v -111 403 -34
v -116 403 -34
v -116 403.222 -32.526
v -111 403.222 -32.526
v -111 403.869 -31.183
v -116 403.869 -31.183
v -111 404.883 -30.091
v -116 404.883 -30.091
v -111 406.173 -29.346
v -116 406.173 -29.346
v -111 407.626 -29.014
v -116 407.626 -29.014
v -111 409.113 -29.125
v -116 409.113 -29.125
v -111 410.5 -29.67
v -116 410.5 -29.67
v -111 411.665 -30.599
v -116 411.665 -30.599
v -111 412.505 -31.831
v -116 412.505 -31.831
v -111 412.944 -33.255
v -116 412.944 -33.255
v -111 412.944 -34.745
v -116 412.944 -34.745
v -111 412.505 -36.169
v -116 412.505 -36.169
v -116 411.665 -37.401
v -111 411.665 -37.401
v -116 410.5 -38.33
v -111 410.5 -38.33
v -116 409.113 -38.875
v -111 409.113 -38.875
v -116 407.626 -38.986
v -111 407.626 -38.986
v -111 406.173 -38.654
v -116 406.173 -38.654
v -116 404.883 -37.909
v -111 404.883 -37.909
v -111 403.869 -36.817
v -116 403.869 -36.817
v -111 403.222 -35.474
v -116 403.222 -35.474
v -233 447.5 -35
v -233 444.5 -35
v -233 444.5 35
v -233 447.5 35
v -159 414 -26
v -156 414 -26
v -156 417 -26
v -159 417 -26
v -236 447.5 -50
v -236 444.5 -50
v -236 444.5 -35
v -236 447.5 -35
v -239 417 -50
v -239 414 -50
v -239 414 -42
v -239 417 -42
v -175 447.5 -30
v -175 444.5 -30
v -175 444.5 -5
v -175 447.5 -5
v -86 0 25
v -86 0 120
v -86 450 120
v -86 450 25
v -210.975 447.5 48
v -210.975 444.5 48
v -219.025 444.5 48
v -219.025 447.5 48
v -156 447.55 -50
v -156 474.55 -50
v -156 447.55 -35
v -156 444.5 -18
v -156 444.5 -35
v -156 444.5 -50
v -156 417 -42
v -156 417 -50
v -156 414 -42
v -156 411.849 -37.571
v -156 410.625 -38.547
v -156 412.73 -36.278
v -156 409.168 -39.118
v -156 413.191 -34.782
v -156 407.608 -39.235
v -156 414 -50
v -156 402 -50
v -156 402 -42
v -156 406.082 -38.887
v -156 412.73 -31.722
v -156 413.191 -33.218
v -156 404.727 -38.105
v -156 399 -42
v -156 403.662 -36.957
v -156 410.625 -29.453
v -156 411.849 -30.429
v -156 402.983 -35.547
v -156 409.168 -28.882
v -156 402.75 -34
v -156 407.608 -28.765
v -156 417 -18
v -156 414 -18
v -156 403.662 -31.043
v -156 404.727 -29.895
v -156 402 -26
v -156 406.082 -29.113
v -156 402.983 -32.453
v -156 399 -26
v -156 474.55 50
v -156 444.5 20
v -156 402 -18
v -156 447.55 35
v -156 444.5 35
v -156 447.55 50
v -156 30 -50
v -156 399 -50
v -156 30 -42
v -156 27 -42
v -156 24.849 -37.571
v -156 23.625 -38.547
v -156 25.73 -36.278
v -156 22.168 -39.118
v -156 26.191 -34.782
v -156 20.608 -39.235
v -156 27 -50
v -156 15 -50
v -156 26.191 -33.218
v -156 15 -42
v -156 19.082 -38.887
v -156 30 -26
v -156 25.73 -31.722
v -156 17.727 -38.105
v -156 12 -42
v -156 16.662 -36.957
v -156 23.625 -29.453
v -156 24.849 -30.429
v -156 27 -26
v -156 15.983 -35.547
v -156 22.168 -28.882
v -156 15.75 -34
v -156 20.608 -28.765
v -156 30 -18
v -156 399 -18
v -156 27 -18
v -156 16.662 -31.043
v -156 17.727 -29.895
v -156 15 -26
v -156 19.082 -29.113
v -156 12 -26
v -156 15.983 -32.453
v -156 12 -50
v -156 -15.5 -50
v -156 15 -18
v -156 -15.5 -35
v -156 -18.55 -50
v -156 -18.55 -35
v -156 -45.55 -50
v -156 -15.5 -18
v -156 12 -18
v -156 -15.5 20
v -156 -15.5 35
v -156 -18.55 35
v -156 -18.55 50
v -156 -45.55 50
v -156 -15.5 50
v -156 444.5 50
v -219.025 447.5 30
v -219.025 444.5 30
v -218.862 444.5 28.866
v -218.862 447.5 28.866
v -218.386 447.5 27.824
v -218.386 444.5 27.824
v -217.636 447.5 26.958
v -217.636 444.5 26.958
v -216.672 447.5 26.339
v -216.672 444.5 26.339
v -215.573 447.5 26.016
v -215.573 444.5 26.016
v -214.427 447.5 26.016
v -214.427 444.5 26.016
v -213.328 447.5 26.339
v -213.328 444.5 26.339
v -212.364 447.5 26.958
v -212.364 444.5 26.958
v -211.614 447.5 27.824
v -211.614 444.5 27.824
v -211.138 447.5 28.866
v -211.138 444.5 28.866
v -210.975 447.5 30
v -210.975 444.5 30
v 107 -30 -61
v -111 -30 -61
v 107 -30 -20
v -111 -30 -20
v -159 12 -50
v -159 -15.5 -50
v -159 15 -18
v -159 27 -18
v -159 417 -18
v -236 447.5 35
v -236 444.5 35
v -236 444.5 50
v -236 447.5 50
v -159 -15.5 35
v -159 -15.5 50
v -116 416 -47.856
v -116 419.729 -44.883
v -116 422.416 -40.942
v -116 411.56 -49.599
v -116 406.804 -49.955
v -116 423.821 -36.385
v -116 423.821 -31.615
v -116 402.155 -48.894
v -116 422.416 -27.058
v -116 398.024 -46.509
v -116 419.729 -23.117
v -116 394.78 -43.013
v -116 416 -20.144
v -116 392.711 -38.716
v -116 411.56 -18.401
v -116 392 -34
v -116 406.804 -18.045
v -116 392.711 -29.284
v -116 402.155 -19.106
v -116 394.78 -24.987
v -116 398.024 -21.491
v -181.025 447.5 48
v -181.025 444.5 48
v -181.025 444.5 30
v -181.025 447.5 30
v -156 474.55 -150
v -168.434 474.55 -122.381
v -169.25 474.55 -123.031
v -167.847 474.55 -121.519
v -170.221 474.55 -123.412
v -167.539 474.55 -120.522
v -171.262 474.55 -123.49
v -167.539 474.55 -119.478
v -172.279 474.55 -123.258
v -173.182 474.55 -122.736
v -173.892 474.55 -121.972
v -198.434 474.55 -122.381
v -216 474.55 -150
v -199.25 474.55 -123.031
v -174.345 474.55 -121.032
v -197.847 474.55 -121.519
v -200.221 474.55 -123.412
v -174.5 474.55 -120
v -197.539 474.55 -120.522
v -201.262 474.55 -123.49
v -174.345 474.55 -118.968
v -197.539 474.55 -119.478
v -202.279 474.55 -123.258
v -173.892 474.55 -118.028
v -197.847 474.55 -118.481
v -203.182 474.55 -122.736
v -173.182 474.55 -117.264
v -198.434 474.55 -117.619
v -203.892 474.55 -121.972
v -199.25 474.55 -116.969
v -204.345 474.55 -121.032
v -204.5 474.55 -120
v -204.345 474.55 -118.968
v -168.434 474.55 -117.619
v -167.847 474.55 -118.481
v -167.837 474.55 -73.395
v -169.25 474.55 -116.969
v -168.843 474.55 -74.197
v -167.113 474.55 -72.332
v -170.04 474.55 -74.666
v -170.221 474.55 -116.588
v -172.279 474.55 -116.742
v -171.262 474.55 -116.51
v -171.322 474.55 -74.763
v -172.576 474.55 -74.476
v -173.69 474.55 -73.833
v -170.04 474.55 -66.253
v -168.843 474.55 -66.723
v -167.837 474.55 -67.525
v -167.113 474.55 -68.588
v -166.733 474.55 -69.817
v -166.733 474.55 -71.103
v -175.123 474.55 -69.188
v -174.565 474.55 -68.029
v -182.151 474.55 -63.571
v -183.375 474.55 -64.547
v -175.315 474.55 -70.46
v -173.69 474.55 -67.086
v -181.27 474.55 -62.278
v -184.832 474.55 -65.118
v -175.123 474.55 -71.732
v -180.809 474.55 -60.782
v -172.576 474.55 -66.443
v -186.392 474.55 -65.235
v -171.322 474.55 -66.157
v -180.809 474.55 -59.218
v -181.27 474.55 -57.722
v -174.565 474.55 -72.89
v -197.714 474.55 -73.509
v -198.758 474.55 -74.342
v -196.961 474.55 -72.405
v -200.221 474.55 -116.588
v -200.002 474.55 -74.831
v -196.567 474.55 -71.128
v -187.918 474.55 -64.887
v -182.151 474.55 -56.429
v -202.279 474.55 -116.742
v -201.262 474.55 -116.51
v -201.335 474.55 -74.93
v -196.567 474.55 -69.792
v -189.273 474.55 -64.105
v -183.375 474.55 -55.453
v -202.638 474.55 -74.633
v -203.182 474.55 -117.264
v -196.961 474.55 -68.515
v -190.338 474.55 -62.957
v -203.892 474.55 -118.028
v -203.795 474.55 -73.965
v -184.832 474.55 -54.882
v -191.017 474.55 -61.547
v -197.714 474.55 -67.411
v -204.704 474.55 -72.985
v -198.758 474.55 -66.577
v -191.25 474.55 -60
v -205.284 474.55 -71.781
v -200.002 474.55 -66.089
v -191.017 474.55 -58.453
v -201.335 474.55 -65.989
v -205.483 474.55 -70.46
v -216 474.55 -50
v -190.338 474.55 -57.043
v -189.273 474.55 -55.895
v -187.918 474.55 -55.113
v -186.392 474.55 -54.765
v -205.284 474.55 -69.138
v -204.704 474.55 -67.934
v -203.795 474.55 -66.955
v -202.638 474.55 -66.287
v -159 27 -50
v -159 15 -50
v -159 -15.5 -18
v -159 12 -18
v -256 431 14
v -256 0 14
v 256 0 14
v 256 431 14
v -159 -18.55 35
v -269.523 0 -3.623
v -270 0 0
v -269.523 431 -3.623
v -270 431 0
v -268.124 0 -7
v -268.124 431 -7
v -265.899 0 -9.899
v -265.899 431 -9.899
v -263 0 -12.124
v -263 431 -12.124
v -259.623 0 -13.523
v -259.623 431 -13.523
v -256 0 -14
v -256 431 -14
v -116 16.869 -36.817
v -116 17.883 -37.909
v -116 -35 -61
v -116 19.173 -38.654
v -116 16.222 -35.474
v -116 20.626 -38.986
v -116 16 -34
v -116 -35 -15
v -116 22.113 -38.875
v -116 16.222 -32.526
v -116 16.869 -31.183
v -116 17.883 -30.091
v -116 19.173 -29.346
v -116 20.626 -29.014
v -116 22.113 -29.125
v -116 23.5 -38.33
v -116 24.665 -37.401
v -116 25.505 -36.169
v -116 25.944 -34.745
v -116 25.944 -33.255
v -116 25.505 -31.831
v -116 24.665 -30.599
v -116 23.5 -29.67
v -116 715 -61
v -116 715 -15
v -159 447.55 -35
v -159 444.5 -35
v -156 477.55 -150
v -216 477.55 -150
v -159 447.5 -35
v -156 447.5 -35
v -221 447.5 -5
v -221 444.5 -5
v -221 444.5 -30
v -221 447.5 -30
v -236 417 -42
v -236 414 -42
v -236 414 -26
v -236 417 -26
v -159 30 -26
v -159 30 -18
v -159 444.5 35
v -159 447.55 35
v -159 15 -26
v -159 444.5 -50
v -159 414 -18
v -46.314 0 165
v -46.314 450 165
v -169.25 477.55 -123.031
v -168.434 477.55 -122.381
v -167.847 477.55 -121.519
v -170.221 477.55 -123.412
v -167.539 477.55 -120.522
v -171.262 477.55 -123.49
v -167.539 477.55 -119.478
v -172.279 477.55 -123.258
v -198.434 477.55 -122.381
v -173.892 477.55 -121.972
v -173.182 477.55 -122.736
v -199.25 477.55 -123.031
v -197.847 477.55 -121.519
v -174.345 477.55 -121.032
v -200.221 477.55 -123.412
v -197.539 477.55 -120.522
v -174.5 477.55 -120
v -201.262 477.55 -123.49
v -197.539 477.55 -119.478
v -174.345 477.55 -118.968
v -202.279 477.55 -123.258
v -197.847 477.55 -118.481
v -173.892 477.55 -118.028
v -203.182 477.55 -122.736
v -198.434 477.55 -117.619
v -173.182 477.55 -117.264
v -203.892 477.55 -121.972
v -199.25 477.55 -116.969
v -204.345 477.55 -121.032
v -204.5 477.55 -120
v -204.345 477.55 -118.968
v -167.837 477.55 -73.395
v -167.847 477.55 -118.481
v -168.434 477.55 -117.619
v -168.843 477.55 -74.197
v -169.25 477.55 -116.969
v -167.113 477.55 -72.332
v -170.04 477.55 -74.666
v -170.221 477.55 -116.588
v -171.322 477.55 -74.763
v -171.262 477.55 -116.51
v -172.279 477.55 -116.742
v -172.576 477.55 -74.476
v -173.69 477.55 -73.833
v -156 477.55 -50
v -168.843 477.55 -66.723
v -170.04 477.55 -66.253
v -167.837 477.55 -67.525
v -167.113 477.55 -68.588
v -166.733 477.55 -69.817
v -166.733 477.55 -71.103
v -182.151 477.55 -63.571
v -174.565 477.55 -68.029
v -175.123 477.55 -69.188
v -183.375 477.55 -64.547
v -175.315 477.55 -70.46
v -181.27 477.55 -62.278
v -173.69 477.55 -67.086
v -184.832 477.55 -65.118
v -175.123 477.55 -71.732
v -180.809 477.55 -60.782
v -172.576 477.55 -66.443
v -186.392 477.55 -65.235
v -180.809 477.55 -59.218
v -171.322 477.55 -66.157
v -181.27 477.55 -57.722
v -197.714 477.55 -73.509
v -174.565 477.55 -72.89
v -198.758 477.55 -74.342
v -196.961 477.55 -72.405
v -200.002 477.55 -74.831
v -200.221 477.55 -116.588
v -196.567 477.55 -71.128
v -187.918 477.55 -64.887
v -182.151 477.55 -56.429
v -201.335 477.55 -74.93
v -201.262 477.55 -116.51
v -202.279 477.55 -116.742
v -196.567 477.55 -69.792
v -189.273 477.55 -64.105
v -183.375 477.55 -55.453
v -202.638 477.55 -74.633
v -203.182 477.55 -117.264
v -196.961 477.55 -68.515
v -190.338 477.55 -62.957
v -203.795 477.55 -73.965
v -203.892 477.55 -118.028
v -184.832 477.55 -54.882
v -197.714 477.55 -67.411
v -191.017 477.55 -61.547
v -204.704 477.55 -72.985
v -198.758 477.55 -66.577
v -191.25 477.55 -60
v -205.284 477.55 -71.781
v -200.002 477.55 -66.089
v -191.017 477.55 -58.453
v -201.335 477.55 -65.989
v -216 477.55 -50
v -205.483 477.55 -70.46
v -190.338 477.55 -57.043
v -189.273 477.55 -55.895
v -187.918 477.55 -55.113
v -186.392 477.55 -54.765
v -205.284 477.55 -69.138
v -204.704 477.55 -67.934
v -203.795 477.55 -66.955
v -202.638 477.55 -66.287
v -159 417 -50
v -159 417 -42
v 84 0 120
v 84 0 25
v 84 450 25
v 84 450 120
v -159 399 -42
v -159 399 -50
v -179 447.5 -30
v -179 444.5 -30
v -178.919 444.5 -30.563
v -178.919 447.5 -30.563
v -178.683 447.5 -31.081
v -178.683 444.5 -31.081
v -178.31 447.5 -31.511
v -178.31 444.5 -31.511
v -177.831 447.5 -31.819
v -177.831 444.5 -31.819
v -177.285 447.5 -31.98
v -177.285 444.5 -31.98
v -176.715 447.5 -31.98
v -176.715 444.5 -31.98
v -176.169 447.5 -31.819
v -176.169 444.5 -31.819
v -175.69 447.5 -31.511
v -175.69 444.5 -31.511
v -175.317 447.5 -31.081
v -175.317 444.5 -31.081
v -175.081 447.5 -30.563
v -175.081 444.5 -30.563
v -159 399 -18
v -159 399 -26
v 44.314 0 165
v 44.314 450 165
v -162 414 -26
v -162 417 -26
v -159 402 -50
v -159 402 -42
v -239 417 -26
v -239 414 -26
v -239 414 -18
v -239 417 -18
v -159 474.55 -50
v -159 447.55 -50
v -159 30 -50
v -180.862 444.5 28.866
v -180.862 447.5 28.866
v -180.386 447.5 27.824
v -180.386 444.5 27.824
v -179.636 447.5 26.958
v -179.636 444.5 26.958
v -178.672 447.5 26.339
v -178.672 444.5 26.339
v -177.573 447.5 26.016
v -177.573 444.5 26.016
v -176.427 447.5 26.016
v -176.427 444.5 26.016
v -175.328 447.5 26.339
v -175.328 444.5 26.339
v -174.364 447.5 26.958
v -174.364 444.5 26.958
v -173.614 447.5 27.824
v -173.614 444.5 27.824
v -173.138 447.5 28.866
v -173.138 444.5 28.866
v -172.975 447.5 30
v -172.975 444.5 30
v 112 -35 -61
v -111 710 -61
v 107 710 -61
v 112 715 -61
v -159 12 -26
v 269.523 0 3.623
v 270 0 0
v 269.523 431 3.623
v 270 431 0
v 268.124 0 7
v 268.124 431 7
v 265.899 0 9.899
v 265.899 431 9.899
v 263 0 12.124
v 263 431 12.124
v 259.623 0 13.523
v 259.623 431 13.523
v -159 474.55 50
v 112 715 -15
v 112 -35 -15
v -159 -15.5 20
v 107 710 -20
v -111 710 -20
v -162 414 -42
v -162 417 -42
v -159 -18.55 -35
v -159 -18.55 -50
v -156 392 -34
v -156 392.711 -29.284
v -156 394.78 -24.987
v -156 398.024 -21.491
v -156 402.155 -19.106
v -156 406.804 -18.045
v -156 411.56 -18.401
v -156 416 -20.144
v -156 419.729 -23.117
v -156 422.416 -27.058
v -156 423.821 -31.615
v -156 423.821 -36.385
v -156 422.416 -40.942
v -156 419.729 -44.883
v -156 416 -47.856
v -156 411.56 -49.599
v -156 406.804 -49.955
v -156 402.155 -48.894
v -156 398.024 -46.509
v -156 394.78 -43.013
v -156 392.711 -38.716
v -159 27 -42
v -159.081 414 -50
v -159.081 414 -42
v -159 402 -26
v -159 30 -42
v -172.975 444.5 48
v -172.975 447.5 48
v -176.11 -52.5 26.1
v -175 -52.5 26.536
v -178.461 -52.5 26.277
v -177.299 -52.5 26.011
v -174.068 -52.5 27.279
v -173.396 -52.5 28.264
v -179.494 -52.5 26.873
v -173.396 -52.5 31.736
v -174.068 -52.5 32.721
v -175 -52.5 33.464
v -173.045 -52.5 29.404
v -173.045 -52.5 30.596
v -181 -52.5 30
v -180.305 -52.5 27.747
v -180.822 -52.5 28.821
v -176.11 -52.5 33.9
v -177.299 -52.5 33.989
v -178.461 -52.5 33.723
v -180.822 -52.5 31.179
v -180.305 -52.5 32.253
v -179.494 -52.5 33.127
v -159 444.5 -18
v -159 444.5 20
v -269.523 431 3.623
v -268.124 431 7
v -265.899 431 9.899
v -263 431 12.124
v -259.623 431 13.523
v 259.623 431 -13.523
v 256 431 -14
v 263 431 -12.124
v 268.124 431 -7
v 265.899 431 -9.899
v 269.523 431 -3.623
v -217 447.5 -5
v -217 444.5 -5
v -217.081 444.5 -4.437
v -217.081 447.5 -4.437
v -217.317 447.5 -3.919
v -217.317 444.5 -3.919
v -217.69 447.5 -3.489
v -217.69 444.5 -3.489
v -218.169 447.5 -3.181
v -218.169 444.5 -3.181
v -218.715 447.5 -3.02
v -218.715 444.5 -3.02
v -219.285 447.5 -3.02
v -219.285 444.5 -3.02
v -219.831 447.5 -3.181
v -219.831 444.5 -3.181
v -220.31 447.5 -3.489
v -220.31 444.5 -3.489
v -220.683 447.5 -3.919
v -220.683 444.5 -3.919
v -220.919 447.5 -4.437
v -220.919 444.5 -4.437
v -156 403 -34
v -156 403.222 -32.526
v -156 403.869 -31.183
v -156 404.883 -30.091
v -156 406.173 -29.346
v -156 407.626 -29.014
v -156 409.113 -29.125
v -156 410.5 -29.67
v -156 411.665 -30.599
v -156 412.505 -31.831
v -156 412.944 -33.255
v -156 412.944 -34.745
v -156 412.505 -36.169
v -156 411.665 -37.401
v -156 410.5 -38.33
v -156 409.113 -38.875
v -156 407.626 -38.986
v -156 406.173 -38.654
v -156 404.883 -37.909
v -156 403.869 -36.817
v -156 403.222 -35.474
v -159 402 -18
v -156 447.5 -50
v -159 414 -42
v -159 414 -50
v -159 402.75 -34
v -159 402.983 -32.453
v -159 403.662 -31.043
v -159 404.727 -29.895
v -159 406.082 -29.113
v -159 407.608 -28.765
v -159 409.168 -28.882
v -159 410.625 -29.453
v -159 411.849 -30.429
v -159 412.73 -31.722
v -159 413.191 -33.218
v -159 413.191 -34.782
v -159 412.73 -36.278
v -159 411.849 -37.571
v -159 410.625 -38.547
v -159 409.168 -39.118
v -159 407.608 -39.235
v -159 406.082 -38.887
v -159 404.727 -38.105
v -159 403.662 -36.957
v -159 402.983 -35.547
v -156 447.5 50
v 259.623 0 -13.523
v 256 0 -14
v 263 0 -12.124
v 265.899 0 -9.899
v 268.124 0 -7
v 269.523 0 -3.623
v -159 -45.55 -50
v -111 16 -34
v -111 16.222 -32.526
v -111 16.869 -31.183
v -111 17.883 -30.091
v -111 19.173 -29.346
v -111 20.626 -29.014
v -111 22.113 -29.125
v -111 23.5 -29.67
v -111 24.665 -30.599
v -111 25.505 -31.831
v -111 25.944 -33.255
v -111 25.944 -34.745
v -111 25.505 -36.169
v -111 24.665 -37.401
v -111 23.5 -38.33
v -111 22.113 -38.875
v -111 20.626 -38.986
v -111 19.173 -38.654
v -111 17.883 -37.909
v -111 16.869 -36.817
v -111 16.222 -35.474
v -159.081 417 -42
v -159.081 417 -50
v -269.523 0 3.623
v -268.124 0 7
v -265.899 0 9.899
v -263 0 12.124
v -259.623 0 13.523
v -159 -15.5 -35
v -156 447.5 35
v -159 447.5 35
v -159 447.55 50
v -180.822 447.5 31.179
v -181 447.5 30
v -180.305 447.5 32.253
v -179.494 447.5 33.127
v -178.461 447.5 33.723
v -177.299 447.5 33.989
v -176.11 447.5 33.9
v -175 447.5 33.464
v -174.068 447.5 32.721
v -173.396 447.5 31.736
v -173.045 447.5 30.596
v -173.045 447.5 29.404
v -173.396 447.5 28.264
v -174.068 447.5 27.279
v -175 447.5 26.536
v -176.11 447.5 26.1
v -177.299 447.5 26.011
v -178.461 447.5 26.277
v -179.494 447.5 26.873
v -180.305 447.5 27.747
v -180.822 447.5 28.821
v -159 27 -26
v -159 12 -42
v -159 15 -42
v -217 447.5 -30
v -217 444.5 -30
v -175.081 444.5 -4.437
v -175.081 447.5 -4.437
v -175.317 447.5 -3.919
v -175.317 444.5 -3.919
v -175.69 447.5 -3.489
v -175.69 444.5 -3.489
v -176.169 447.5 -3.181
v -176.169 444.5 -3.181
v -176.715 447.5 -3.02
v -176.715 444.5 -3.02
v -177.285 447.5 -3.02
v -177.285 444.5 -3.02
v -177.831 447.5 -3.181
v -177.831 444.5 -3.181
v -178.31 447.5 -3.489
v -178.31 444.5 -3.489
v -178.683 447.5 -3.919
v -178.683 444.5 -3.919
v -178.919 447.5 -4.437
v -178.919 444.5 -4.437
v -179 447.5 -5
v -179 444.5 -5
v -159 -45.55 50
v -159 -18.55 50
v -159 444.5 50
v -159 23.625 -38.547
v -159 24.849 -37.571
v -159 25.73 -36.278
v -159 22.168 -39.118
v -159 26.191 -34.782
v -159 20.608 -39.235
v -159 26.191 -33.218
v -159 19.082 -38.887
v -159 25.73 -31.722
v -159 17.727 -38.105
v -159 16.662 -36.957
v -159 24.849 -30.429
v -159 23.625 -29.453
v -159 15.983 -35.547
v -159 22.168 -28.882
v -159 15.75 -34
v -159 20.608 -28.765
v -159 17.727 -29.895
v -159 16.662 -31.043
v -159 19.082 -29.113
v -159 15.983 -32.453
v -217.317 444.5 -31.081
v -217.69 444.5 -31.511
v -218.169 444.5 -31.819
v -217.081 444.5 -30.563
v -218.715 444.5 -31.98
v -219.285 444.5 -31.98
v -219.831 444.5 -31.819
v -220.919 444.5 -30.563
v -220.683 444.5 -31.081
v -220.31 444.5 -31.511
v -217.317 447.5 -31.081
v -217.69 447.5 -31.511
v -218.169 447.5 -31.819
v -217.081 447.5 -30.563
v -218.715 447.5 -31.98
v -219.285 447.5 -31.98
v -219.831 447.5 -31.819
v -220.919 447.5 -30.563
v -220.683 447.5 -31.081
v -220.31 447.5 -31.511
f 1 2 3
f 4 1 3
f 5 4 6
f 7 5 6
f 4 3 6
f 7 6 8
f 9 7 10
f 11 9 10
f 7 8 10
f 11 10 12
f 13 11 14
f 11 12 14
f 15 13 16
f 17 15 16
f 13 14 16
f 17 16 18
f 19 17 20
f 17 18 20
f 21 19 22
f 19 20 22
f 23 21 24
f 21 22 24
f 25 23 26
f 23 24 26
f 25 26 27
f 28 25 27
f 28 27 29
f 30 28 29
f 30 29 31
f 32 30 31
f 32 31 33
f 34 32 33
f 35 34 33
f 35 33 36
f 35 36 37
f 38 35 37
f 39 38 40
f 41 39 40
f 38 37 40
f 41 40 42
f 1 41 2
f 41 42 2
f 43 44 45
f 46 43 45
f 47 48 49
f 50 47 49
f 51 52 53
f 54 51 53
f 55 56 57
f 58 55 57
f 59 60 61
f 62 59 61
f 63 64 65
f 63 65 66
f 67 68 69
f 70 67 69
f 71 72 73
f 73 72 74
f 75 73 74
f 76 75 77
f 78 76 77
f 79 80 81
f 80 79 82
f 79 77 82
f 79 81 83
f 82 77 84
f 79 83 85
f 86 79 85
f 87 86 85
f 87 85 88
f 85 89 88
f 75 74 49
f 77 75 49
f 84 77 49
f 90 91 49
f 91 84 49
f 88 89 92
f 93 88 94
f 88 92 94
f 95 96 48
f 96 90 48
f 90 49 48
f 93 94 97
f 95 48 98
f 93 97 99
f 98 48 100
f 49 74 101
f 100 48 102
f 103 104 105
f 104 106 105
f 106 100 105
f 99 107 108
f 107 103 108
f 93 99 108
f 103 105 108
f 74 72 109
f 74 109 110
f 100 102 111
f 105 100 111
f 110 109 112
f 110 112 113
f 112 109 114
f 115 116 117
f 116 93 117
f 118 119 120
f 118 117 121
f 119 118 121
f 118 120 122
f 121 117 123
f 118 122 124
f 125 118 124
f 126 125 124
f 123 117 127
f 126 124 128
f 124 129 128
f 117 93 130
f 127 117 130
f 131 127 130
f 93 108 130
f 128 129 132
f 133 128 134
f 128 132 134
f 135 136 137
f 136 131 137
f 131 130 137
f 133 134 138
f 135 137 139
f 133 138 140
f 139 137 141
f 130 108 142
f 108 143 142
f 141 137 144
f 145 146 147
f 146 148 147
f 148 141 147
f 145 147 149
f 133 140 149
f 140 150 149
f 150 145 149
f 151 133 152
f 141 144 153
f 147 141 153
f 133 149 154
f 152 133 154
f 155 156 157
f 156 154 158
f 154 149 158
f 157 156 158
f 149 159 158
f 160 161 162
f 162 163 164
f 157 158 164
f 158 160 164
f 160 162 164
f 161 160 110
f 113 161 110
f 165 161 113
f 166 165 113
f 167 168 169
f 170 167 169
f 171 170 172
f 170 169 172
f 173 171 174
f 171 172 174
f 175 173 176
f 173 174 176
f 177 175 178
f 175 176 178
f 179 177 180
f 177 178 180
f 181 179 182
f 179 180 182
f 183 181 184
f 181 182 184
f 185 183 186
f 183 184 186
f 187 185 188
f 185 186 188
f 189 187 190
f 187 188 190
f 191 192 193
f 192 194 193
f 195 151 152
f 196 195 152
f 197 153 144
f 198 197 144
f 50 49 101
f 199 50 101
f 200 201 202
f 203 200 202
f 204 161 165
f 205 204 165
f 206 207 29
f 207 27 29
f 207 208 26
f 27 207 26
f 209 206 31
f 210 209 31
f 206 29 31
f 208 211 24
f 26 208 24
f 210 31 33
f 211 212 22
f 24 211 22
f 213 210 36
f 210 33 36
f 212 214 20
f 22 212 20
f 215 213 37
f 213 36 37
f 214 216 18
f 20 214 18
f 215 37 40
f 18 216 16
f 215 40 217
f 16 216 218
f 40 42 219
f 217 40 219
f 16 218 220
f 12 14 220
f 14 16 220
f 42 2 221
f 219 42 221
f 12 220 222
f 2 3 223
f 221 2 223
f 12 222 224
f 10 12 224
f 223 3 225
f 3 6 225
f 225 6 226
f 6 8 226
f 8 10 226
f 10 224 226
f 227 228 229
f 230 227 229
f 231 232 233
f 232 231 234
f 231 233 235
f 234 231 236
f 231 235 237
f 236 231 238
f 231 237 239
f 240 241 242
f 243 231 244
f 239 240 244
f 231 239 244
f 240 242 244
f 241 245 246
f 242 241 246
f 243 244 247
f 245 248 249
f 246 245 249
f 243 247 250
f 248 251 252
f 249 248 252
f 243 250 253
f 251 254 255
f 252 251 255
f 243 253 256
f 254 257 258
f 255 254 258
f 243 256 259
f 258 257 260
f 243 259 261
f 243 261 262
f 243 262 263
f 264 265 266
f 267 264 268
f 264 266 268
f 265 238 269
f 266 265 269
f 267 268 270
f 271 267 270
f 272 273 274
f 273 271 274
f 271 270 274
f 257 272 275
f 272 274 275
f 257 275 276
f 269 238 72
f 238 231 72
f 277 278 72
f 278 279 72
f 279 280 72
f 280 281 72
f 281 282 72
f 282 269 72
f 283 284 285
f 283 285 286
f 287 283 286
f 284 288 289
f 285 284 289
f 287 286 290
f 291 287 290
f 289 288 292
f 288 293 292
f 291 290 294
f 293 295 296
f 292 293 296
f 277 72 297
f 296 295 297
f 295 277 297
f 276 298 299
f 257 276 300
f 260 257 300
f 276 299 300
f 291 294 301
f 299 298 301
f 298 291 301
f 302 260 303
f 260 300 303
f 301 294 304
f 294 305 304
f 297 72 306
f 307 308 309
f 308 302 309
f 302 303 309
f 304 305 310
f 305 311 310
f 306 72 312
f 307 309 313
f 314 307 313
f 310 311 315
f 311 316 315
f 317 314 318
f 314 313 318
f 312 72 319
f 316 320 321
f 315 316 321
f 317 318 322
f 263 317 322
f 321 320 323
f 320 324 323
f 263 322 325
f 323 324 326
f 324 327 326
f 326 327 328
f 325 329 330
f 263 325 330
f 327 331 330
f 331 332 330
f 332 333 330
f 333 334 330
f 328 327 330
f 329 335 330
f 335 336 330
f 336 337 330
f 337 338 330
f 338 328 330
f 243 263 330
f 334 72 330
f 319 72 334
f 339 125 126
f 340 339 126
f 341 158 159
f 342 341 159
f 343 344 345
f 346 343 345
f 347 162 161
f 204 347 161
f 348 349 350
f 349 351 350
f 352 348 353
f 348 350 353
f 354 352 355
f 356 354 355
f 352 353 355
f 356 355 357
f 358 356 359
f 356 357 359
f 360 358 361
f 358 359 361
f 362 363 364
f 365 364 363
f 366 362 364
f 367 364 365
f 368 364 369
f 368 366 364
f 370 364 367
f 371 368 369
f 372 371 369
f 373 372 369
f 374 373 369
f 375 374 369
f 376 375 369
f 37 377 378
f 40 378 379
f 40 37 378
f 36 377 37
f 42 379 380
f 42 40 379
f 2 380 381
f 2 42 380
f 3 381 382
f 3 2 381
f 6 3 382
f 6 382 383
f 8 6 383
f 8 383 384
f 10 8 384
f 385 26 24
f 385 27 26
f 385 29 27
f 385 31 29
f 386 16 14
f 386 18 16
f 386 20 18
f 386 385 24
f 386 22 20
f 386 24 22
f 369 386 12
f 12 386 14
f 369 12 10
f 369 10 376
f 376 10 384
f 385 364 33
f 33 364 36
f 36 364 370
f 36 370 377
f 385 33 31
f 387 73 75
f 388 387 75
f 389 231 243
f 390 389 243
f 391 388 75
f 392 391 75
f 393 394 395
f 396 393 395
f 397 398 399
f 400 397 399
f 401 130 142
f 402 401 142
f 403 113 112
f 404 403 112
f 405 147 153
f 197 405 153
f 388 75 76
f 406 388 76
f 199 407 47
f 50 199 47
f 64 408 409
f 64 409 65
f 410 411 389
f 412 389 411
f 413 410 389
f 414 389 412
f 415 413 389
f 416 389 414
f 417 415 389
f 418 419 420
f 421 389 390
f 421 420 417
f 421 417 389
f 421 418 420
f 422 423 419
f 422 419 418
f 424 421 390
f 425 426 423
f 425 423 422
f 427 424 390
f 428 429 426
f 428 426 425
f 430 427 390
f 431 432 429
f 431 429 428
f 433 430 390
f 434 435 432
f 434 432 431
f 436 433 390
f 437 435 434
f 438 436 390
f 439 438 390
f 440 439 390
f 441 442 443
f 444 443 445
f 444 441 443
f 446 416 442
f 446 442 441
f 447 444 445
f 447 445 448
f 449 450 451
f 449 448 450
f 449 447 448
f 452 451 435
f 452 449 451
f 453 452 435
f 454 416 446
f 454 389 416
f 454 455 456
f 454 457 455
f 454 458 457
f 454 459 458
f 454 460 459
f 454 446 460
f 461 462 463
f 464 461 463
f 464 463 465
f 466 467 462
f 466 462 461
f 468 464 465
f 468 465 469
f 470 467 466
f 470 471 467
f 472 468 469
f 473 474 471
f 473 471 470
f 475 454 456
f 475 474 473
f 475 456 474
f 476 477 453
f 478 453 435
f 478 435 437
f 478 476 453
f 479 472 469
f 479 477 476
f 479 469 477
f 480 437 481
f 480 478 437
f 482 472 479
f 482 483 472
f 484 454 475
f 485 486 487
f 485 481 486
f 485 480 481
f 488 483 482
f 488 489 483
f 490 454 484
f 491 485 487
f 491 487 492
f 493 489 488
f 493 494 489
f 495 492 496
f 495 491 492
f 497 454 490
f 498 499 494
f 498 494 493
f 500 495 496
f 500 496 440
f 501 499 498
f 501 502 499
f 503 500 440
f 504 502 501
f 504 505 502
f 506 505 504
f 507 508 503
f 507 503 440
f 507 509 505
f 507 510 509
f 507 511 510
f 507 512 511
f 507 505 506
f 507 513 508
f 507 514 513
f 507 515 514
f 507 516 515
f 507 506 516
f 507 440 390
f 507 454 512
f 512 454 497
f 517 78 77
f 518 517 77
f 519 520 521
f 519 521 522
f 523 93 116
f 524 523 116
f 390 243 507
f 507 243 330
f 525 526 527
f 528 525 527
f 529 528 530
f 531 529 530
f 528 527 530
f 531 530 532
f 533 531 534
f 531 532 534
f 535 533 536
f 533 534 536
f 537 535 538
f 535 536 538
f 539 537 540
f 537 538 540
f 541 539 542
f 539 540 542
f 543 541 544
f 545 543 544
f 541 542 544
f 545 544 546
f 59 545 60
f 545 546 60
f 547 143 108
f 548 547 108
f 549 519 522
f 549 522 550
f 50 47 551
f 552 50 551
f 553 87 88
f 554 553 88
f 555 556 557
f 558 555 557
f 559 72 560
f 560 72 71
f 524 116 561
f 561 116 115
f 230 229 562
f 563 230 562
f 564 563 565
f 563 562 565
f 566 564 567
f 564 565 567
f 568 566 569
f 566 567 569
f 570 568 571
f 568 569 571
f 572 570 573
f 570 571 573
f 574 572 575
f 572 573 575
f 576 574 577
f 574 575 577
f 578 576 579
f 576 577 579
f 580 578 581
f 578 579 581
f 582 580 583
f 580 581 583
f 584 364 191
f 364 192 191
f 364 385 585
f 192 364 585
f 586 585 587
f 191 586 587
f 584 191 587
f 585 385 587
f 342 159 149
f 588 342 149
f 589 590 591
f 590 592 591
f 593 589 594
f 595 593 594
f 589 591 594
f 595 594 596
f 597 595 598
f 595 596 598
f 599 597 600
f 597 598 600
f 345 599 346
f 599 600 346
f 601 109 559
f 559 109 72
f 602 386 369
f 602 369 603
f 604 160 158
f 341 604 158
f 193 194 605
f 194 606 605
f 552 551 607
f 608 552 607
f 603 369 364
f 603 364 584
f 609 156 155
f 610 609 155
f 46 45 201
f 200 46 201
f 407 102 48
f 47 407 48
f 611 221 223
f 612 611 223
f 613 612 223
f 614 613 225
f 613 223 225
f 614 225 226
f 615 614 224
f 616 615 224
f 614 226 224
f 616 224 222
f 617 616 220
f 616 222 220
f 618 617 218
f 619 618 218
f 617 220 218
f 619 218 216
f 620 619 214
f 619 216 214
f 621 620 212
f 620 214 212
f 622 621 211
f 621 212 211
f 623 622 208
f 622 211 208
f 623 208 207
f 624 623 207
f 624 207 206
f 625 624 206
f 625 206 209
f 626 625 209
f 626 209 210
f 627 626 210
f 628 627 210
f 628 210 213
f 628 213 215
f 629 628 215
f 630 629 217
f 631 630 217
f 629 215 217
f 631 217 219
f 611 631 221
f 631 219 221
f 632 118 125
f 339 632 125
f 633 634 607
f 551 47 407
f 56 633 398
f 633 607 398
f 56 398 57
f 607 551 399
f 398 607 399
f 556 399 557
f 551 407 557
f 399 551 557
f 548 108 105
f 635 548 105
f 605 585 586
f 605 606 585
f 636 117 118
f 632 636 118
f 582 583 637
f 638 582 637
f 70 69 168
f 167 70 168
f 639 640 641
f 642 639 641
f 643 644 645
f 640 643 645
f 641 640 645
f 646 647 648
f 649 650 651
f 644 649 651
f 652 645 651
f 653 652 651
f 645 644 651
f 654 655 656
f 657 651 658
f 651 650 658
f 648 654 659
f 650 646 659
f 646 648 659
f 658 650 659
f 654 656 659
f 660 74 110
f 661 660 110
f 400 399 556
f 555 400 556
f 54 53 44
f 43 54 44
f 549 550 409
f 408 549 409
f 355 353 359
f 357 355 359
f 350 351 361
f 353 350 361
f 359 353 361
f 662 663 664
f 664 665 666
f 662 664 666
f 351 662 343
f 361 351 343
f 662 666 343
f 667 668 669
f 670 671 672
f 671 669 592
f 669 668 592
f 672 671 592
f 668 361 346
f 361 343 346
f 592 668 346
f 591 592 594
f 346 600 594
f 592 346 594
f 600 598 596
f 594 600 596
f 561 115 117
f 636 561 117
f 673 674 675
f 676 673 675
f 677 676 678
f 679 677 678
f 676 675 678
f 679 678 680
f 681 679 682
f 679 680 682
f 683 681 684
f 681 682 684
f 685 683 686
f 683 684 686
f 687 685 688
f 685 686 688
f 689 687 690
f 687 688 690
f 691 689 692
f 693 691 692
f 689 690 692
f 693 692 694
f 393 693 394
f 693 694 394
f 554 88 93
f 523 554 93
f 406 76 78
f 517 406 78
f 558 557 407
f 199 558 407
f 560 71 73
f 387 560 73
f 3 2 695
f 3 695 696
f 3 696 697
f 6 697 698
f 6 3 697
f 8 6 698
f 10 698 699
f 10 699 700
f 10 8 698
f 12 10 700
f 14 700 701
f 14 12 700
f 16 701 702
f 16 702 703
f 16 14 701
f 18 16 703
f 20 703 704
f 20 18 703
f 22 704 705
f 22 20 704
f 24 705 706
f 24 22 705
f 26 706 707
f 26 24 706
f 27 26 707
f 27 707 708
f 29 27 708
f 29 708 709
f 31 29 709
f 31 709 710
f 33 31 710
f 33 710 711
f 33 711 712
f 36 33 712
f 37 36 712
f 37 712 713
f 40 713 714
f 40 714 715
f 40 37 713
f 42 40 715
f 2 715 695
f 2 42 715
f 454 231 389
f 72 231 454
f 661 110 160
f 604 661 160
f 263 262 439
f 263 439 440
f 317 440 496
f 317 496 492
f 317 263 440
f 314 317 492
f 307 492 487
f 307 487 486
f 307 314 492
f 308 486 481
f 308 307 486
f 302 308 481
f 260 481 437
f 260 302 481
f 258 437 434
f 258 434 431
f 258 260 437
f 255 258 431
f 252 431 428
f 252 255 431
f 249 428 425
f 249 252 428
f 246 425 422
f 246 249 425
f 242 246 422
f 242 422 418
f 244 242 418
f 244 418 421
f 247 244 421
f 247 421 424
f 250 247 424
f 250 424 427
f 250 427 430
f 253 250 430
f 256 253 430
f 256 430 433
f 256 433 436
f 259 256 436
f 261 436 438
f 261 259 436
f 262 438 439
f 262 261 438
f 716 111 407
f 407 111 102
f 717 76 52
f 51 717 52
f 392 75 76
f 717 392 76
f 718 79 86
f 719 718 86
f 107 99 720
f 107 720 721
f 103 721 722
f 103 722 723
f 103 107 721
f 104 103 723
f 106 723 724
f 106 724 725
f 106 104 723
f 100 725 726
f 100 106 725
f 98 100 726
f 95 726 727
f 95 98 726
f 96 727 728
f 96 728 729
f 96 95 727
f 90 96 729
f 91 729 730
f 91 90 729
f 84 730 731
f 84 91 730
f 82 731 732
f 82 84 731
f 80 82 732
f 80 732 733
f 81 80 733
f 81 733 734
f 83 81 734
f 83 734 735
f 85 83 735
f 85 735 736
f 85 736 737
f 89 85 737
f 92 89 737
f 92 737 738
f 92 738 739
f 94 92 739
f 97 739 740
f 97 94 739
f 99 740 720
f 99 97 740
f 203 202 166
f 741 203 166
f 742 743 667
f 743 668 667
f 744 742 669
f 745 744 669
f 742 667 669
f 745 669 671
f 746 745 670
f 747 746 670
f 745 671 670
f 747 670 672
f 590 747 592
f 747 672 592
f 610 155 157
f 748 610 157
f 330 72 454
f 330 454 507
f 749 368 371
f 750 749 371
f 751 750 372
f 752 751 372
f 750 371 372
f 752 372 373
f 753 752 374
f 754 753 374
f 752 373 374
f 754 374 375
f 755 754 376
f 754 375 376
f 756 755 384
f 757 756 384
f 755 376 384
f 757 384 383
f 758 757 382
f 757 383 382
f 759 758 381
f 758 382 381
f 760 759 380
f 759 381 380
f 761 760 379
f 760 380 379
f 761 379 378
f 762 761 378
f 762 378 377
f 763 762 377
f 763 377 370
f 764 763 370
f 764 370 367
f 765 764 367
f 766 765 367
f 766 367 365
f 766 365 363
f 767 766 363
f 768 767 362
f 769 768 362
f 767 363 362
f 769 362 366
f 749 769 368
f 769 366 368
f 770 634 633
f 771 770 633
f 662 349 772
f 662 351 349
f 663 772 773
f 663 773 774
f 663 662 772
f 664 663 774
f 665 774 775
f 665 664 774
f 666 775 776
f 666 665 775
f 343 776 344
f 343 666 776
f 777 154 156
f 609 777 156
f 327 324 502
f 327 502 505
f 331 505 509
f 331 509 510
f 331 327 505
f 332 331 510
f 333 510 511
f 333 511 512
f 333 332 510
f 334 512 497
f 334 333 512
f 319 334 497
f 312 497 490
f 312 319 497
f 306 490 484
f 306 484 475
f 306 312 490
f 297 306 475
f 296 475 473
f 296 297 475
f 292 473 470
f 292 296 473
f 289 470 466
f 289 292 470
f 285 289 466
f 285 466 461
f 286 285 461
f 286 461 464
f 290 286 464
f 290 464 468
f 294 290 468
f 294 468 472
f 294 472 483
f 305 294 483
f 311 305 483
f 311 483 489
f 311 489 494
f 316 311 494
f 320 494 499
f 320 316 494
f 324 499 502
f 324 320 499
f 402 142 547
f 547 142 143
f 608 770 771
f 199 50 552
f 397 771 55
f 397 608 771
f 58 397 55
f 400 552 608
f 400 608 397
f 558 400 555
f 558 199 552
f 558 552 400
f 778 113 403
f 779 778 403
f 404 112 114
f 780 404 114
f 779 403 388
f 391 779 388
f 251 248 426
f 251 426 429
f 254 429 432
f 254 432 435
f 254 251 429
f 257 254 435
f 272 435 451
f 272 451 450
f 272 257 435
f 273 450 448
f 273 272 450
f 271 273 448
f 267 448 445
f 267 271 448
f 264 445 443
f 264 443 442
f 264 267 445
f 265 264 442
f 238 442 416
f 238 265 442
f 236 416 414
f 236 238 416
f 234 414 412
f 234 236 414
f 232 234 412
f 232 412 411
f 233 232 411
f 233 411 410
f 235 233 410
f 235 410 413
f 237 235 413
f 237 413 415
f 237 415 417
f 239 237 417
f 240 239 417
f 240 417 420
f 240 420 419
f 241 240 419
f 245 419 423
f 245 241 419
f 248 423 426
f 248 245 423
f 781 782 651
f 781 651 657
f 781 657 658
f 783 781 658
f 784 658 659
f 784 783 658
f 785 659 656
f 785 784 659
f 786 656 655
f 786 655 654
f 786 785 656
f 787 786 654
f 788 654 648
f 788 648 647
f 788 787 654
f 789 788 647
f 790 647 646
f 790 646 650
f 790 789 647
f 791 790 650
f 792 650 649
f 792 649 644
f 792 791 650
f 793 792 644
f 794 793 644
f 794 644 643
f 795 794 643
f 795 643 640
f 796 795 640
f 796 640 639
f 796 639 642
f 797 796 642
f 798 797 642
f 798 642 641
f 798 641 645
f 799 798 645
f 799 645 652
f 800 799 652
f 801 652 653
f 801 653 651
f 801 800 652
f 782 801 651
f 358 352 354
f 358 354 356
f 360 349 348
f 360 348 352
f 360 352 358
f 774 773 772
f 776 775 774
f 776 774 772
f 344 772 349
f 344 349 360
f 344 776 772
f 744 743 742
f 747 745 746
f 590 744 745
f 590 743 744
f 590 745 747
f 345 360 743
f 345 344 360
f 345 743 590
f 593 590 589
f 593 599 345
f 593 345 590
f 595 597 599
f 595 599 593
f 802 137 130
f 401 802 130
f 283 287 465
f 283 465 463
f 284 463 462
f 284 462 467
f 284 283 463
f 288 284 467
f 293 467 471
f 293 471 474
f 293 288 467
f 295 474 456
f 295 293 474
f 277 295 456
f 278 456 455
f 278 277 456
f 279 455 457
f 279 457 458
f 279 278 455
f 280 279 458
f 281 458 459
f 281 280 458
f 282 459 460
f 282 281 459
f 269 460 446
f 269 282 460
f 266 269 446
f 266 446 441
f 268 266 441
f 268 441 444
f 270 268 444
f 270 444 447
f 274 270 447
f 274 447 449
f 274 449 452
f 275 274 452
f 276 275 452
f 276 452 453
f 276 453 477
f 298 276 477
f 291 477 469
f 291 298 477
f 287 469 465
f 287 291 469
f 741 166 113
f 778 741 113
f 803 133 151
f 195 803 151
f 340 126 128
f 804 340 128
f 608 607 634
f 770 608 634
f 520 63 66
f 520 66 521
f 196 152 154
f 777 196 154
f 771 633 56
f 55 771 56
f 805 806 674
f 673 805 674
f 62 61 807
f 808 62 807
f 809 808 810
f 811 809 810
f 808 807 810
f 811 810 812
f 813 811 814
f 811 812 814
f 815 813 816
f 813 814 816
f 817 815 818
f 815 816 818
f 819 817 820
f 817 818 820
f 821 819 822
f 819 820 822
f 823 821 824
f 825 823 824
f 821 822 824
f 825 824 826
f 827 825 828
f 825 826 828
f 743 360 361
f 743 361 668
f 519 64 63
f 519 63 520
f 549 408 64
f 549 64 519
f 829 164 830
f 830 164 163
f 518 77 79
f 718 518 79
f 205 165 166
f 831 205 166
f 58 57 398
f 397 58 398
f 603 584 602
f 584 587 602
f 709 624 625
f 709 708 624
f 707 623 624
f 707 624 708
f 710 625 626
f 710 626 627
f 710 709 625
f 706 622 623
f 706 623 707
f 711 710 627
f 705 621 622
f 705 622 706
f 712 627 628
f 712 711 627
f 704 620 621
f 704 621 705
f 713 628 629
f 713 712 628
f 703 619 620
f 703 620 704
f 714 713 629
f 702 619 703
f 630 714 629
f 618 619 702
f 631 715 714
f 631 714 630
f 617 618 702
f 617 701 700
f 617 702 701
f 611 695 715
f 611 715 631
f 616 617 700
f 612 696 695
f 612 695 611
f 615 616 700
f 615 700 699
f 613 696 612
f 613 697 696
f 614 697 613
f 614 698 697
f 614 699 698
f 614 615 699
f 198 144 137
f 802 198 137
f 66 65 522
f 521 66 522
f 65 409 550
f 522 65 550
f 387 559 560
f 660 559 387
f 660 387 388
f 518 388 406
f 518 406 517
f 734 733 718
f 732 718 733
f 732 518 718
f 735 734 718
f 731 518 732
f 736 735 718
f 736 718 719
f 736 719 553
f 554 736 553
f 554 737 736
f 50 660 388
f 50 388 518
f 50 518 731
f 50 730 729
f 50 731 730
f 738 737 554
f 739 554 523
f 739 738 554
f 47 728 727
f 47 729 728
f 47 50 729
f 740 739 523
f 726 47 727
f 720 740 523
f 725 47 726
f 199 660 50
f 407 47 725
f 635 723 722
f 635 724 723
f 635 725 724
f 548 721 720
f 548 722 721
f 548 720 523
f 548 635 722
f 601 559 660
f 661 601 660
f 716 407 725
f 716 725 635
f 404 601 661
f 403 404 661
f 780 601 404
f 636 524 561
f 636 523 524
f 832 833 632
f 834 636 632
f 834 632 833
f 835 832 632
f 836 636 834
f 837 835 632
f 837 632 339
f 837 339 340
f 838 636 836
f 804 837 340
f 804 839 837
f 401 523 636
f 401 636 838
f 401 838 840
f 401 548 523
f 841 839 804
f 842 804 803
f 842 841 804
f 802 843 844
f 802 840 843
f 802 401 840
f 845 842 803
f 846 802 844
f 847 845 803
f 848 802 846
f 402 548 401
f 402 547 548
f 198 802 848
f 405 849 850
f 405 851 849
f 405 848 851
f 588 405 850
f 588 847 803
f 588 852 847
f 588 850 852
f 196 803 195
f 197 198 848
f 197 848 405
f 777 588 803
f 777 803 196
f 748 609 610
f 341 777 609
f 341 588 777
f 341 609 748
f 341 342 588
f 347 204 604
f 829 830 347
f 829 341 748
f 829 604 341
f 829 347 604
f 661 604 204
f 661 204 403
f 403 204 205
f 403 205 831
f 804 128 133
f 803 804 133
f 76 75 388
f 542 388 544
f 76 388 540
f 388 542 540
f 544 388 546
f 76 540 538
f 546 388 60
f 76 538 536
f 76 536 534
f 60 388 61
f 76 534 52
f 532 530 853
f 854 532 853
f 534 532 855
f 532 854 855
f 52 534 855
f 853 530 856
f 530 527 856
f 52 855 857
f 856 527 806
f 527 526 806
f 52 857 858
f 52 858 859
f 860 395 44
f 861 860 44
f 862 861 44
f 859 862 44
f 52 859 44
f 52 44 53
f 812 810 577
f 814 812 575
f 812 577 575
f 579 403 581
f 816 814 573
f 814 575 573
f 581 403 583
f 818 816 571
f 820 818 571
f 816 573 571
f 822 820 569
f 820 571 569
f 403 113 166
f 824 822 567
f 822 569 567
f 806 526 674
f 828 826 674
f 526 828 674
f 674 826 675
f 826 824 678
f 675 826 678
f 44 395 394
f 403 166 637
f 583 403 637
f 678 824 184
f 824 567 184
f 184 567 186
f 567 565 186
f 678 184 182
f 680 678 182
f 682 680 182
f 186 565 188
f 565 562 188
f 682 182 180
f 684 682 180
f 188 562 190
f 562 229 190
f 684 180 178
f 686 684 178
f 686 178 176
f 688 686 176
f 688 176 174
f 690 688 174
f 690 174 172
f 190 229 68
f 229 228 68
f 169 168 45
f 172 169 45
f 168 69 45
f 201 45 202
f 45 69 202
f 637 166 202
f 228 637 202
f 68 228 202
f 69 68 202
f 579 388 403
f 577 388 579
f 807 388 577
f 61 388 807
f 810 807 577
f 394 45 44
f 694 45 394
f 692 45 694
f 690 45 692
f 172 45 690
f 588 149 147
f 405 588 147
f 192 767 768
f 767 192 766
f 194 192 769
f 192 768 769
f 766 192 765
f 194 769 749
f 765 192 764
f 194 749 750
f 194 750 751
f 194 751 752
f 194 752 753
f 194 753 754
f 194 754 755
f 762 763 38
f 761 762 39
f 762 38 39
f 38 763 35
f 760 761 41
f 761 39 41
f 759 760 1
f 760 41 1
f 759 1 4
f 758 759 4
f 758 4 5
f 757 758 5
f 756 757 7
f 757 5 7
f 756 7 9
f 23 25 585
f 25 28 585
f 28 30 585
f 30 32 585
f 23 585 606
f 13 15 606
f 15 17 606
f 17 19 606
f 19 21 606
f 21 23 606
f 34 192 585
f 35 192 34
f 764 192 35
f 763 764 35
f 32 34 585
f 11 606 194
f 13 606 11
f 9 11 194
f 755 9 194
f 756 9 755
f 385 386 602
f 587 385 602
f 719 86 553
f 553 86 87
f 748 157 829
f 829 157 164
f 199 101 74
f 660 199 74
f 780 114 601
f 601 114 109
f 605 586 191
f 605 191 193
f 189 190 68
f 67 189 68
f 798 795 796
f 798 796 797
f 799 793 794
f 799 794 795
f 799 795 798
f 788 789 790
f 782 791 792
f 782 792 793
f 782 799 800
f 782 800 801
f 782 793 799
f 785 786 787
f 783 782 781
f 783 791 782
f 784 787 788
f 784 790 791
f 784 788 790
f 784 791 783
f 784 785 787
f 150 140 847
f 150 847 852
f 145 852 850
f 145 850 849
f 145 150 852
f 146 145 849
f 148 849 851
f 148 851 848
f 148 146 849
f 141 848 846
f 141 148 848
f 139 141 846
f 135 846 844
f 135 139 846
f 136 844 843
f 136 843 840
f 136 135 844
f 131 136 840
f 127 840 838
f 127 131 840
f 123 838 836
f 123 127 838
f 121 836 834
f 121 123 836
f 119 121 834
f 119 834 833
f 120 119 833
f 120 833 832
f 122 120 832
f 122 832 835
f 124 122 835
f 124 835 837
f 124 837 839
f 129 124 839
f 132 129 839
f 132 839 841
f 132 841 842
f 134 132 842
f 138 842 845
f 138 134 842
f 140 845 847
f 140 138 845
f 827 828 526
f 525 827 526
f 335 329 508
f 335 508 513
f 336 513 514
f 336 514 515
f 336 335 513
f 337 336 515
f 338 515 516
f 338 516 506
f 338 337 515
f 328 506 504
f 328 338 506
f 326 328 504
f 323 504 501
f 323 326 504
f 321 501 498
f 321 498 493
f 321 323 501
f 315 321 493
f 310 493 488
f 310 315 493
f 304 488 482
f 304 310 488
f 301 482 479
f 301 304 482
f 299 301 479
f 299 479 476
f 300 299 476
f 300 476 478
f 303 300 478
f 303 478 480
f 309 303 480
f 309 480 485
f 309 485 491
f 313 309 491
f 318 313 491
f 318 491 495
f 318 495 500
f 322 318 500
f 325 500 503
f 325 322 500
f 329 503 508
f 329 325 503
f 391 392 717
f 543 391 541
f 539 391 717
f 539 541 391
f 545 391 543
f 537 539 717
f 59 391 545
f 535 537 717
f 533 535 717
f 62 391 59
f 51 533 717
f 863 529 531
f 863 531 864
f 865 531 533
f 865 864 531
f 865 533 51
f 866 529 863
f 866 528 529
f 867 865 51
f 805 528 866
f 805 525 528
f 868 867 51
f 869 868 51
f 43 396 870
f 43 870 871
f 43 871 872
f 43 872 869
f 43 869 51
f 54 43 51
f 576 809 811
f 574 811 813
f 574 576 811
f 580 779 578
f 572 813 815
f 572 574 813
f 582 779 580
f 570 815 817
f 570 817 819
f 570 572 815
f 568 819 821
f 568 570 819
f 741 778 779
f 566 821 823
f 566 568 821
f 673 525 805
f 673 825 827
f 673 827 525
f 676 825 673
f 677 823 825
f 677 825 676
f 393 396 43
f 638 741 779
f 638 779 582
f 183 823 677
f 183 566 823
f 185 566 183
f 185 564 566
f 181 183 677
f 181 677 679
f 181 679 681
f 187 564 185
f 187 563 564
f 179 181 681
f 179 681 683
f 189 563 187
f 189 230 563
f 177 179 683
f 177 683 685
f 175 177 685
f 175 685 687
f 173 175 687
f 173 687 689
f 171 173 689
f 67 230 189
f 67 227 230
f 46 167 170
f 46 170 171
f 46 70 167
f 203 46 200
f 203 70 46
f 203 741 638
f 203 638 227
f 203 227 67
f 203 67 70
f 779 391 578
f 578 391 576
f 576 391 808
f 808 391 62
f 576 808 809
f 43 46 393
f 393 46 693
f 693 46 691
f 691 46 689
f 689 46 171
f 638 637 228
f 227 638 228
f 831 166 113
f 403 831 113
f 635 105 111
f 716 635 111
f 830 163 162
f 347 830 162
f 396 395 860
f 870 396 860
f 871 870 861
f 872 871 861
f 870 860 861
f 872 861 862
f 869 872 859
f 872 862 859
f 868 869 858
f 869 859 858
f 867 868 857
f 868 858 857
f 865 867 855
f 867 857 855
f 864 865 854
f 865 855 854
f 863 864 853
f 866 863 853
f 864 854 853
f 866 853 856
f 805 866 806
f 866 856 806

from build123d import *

# Parameters (mm, degrees)
F0_W           = 540
F0_H           = 28
F1_DEPTH       = 431
F2_R           = 13.99999
F3_W           = 228
F3_H           = 46
F4_DEPTH       = 715
F4_DEPTH_BACK  = 35
F6_DEPTH       = 450
F7_R           = 12.5
F7_R_2         = 6
F8_DEPTH       = 400
F9_T           = -5
F10_R          = 5
F11_DEPTH      = 5
F12_R          = 16
F12_R_2        = 5
F13_DEPTH      = 40
F14_R          = 5.25
F15_DEPTH      = 3
F16_W          = 60
F16_H          = 100
F16_R          = 3.5
F16_R_2        = 4.3147526279
F16_R_3        = 5.25
F16_R_4        = 4.483075575
F17_DEPTH      = 3
F18_R          = 5.25
F18_R_2        = 4.25
F19_DEPTH      = 540
F19_DEPTH_BACK = 20
F21_DEPTH      = 3
F22_R          = 4
F23_DEPTH      = 500
F25_DEPTH      = 3


# Not quite as in the source:
# - a fillet or chamfer is up to 0.001 mm smaller than in the source, because OpenCascade refuses the exact size


with BuildPart() as f1:
    # F0 (on Front) → F1 (new body)
    with BuildSketch(Plane.XZ):
        Rectangle(F0_W, F0_H)
    extrude(amount=-F1_DEPTH)

    # F2 (radius 14 in the source; OpenCascade refuses exactly that, so slightly less here)
    f2_edges = [f1.edges().sort_by_distance(p)[0] for p in [
        (-270, 215.5, 14),
        (-270, 215.5, -14),
        (270, 215.5, 14),
        (270, 215.5, -14),
    ]]
    fillet(f2_edges, radius=F2_R)


with BuildPart() as f4:
    # F3 (on face) → F4 (new body, two sides)
    with BuildSketch(Plane.XZ) as f4_sk:
        with Locations((-2, -38)):
            Rectangle(F3_W, F3_H)
    extrude(amount=-F4_DEPTH)
    extrude(f4_sk.sketch, amount=F4_DEPTH_BACK)

    # F9
    f9_openings = [f4.faces().sort_by_distance(p)[0] for p in [
        (-2, 340, -61),
    ]]
    offset(amount=F9_T, openings=f9_openings)

    # F10 (on face) → F11 (cut)
    with BuildSketch(Plane(origin=(-116, 0, 0), x_dir=(0, -1, 0), z_dir=(-1, 0, 0))):
        with Locations((-21, -34)):
            Circle(F10_R)
        with Locations((-408, -34)):
            Circle(F10_R)
    extrude(amount=-F11_DEPTH, mode=Mode.SUBTRACT)


with BuildPart() as f6:
    # F5 (on Front) → F6 (new body)
    with BuildSketch(Plane.XZ):
        Polygon((44.313730334, 165), (-46.313730334, 165), (-86, 120), (-86, 25), (84, 25), (84, 120), align=None)
    extrude(amount=-F6_DEPTH)


with BuildPart() as f8:
    # F7 (on face) → F8 (new body)
    with BuildSketch(Plane.XZ):
        with Locations((-112.0508164167, 32.2285704315)):
            Circle(F7_R)
        with Locations((-112.0508164167, 32.2285704315)):
            Circle(F7_R_2, mode=Mode.SUBTRACT)
    extrude(amount=-F8_DEPTH)


with BuildPart() as f13:
    # F12 (on face) → F13 (new body)
    with BuildSketch(Plane(origin=(-116, 0, 0), x_dir=(0, -1, 0), z_dir=(-1, 0, 0))):
        with Locations((-408, -34)):
            Circle(F12_R)
        with Locations((-408, -34)):
            Circle(F12_R_2, mode=Mode.SUBTRACT)
    extrude(amount=F13_DEPTH)


with BuildPart() as f15:
    # F14 (on face) → F15 (new body)
    with BuildSketch(Plane(origin=(-156, 0, 0), x_dir=(0, -1, 0), z_dir=(-1, 0, 0))):
        with BuildLine():
            Line((-30, -18), (-214.5, -18))
            Line((-214.5, -18), (-399, -18))
            Line((-399, -18), (-399, -20.7712434447))
            ThreePointArc((-399, -20.7712434447), (-393.8578643763, -26.5166852265), (-392, -34))
            ThreePointArc((-392, -34), (-393.8578643763, -41.4833147735), (-399, -47.2287565553))
            Line((-399, -47.2287565553), (-399, -50))
            Line((-399, -50), (-214.5, -50))
            Line((-214.5, -50), (-30, -50))
            Line((-30, -50), (-30, -42))
            Line((-30, -42), (-27, -42))
            Line((-27, -42), (-27, -50))
            Line((-27, -50), (-15, -50))
            Line((-15, -50), (-15, -42))
            Line((-15, -42), (-12, -42))
            Line((-12, -42), (-12, -50))
            Line((-12, -50), (15.5, -50))
            Line((15.5, -50), (15.5, -35))
            Line((15.5, -35), (18.5499999982, -35.0001049883))
            Line((18.5499999982, -35.0001049883), (18.5499999982, -50))
            Line((18.5499999982, -50), (45.5499999982, -50))
            Line((45.5499999982, -50), (45.5499999982, 50))
            Line((45.5499999982, 50), (18.5499999982, 50))
            Line((18.5499999982, 50), (18.5499999982, 35))
            Line((18.5499999982, 35), (15.4999999982, 35))
            Line((15.4999999982, 35), (15.4999999982, 50))
            Line((15.4999999982, 50), (-444.4999999982, 50))
            Line((-444.4999999982, 50), (-444.4999999982, 35))
            Line((-444.4999999982, 35), (-447.5499999982, 35))
            Line((-447.5499999982, 35), (-447.5499999982, 50))
            Line((-447.5499999982, 50), (-474.5499999982, 50))
            Line((-474.5499999982, 50), (-474.5499999982, -50))
            Line((-474.5499999982, -50), (-447.5499999982, -50))
            Line((-447.5499999982, -50), (-447.5499999982, -35))
            Line((-447.5499999982, -35), (-444.4999999982, -35))
            Line((-444.4999999982, -35), (-444.4999999982, -50))
            Line((-444.4999999982, -50), (-417, -50))
            Line((-417, -50), (-417, -47.2287565553))
            ThreePointArc((-417, -47.2287565553), (-424, -34), (-417, -20.7712434447))
            Line((-417, -20.7712434447), (-417, -18))
            Line((-417, -18), (-444.5, -18))
            Line((-444.5, -18), (-444.5, 20))
            Line((-444.5, 20), (15.5, 20))
            Line((15.5, 20), (15.5, -18))
            Line((15.5, -18), (-12, -18))
            Line((-12, -18), (-12, -26))
            Line((-12, -26), (-15, -26))
            Line((-15, -26), (-15, -18))
            Line((-15, -18), (-27, -18))
            Line((-27, -18), (-27, -26))
            Line((-27, -26), (-30, -26))
            Line((-30, -26), (-30, -18))
        make_face()
        with Locations((-21, -34)):
            Circle(F14_R, mode=Mode.SUBTRACT)
        Polygon((-399, -50), (-214.5, -50), (-30, -50), (-30, -42), (-27, -42), (-27, -50), (-15, -50), (-15, -42), (-12, -42), (-12, -50), (15.5, -50), (15.5, -35), (18.5499999982, -35.0001049883), (18.5499999982, -50), (45.5499999982, -50), (45.5499999982, 50), (18.5499999982, 50), (18.5499999982, 35), (15.4999999982, 35), (15.4999999982, 50), (-444.4999999982, 50), (-444.4999999982, 35), (-447.5499999982, 35), (-447.5499999982, 50), (-474.5499999982, 50), (-474.5499999982, -50), (-447.5499999982, -50), (-447.5499999982, -35), (-444.4999999982, -35), (-444.4999999982, -50), (-417, -50), (-417, -42), (-414, -42), (-414, -50), (-402, -50), (-402, -42), (-399, -42), align=None)
        with Locations((-408, -34)):
            Circle(F14_R, mode=Mode.SUBTRACT)
        Polygon((-30, -18), (-214.5, -18), (-399, -18), (-399, -26), (-402, -26), (-402, -18), (-414, -18), (-414, -26), (-417, -26), (-417, -18), (-444.5, -18), (-444.5, 20), (15.5, 20), (15.5, -18), (-12, -18), (-12, -26), (-15, -26), (-15, -18), (-27, -18), (-27, -26), (-30, -26), align=None, mode=Mode.SUBTRACT)
        with Locations((-21, -34)):
            Circle(F14_R, mode=Mode.SUBTRACT)
    extrude(amount=F15_DEPTH)


with BuildPart() as f17:
    # F16 (on face) → F17 (new body)
    with BuildSketch(Plane(origin=(0, 474.5499999982, 0), x_dir=(-1, 0, 0), z_dir=(0, 1, 0))):
        with Locations((186, -100)):
            Rectangle(F16_W, F16_H)
        with Locations((171, -120)):
            Circle(F16_R, mode=Mode.SUBTRACT)
        with Locations((201, -120)):
            Circle(F16_R, mode=Mode.SUBTRACT)
        with Locations((171, -70.4598784447)):
            Circle(F16_R_2, mode=Mode.SUBTRACT)
        with Locations((186, -60)):
            Circle(F16_R_3, mode=Mode.SUBTRACT)
        with Locations((201, -70.4598784447)):
            Circle(F16_R_4, mode=Mode.SUBTRACT)
    extrude(amount=F17_DEPTH)


with BuildPart() as f19:
    # F18 (on face) → F19 (new body, two sides)
    with BuildSketch(Plane.XZ.offset(-474.5499999982)) as f19_sk:
        with Locations((-186, -60)):
            Circle(F18_R)
        with Locations((-186, -60)):
            Circle(F18_R_2, mode=Mode.SUBTRACT)
    extrude(amount=F19_DEPTH)
    extrude(f19_sk.sketch, amount=-F19_DEPTH_BACK)


with BuildPart() as f21:
    # F20 (on face) → F21 (new body)
    with BuildSketch(Plane(origin=(0, 444.4999999982, 0), x_dir=(-1, 0, 0), z_dir=(0, 1, 0))):
        Polygon((236, 50), (156, 50), (156, 35), (159, 35), (159, -35), (156, -35), (156, -50), (236, -50), (236, -35), (233, -35), (233, 35), (236, 35), align=None)
        with BuildLine():
            Line((179, -5), (179, -30))
            ThreePointArc((179, -30), (177, -32), (175, -30))
            Line((175, -30), (175, -5))
            ThreePointArc((175, -5), (177, -3), (179, -5))
        make_face(mode=Mode.SUBTRACT)
        with BuildLine():
            Line((221, -5), (221, -30))
            ThreePointArc((221, -30), (219, -32), (217, -30))
            Line((217, -30), (217, -5))
            ThreePointArc((217, -5), (219, -3), (221, -5))
        make_face(mode=Mode.SUBTRACT)
        with BuildLine():
            Line((172.975, 30), (172.975, 48))
            Line((172.975, 48), (181.025, 48))
            Line((181.025, 48), (181.025, 30))
            ThreePointArc((181.025, 30), (177, 25.975), (172.975, 30))
        make_face(mode=Mode.SUBTRACT)
        with BuildLine():
            Line((210.975, 30), (210.975, 48))
            Line((210.975, 48), (219.025, 48))
            Line((219.025, 48), (219.025, 30))
            ThreePointArc((219.025, 30), (215, 25.975), (210.975, 30))
        make_face(mode=Mode.SUBTRACT)
    extrude(amount=F21_DEPTH)


with BuildPart() as f23:
    # F22 (on face) → F23 (new body)
    with BuildSketch(Plane(origin=(0, 447.4999999982, 0), x_dir=(-1, 0, 0), z_dir=(0, 1, 0))):
        with Locations((177, 30)):
            Circle(F22_R)
    extrude(amount=-F23_DEPTH)


with BuildPart() as f25:
    # F24 (on face) → F25 (new body)
    with BuildSketch(Plane(origin=(0, 414, 0), x_dir=(-1, 0, 0), z_dir=(0, 1, 0))):
        Polygon((239, -18), (159, -18), (159, -26), (162, -26), (162, -42), (159.0808033943, -42), (159.0808033943, -50), (239, -50), (239, -42), (236, -42), (236, -26), (239, -26), align=None)
    extrude(amount=F25_DEPTH)


solid = Compound([f1.part, f4.part, f6.part, f13.part, f15.part, f17.part, f21.part, f23.part, f25.part])
